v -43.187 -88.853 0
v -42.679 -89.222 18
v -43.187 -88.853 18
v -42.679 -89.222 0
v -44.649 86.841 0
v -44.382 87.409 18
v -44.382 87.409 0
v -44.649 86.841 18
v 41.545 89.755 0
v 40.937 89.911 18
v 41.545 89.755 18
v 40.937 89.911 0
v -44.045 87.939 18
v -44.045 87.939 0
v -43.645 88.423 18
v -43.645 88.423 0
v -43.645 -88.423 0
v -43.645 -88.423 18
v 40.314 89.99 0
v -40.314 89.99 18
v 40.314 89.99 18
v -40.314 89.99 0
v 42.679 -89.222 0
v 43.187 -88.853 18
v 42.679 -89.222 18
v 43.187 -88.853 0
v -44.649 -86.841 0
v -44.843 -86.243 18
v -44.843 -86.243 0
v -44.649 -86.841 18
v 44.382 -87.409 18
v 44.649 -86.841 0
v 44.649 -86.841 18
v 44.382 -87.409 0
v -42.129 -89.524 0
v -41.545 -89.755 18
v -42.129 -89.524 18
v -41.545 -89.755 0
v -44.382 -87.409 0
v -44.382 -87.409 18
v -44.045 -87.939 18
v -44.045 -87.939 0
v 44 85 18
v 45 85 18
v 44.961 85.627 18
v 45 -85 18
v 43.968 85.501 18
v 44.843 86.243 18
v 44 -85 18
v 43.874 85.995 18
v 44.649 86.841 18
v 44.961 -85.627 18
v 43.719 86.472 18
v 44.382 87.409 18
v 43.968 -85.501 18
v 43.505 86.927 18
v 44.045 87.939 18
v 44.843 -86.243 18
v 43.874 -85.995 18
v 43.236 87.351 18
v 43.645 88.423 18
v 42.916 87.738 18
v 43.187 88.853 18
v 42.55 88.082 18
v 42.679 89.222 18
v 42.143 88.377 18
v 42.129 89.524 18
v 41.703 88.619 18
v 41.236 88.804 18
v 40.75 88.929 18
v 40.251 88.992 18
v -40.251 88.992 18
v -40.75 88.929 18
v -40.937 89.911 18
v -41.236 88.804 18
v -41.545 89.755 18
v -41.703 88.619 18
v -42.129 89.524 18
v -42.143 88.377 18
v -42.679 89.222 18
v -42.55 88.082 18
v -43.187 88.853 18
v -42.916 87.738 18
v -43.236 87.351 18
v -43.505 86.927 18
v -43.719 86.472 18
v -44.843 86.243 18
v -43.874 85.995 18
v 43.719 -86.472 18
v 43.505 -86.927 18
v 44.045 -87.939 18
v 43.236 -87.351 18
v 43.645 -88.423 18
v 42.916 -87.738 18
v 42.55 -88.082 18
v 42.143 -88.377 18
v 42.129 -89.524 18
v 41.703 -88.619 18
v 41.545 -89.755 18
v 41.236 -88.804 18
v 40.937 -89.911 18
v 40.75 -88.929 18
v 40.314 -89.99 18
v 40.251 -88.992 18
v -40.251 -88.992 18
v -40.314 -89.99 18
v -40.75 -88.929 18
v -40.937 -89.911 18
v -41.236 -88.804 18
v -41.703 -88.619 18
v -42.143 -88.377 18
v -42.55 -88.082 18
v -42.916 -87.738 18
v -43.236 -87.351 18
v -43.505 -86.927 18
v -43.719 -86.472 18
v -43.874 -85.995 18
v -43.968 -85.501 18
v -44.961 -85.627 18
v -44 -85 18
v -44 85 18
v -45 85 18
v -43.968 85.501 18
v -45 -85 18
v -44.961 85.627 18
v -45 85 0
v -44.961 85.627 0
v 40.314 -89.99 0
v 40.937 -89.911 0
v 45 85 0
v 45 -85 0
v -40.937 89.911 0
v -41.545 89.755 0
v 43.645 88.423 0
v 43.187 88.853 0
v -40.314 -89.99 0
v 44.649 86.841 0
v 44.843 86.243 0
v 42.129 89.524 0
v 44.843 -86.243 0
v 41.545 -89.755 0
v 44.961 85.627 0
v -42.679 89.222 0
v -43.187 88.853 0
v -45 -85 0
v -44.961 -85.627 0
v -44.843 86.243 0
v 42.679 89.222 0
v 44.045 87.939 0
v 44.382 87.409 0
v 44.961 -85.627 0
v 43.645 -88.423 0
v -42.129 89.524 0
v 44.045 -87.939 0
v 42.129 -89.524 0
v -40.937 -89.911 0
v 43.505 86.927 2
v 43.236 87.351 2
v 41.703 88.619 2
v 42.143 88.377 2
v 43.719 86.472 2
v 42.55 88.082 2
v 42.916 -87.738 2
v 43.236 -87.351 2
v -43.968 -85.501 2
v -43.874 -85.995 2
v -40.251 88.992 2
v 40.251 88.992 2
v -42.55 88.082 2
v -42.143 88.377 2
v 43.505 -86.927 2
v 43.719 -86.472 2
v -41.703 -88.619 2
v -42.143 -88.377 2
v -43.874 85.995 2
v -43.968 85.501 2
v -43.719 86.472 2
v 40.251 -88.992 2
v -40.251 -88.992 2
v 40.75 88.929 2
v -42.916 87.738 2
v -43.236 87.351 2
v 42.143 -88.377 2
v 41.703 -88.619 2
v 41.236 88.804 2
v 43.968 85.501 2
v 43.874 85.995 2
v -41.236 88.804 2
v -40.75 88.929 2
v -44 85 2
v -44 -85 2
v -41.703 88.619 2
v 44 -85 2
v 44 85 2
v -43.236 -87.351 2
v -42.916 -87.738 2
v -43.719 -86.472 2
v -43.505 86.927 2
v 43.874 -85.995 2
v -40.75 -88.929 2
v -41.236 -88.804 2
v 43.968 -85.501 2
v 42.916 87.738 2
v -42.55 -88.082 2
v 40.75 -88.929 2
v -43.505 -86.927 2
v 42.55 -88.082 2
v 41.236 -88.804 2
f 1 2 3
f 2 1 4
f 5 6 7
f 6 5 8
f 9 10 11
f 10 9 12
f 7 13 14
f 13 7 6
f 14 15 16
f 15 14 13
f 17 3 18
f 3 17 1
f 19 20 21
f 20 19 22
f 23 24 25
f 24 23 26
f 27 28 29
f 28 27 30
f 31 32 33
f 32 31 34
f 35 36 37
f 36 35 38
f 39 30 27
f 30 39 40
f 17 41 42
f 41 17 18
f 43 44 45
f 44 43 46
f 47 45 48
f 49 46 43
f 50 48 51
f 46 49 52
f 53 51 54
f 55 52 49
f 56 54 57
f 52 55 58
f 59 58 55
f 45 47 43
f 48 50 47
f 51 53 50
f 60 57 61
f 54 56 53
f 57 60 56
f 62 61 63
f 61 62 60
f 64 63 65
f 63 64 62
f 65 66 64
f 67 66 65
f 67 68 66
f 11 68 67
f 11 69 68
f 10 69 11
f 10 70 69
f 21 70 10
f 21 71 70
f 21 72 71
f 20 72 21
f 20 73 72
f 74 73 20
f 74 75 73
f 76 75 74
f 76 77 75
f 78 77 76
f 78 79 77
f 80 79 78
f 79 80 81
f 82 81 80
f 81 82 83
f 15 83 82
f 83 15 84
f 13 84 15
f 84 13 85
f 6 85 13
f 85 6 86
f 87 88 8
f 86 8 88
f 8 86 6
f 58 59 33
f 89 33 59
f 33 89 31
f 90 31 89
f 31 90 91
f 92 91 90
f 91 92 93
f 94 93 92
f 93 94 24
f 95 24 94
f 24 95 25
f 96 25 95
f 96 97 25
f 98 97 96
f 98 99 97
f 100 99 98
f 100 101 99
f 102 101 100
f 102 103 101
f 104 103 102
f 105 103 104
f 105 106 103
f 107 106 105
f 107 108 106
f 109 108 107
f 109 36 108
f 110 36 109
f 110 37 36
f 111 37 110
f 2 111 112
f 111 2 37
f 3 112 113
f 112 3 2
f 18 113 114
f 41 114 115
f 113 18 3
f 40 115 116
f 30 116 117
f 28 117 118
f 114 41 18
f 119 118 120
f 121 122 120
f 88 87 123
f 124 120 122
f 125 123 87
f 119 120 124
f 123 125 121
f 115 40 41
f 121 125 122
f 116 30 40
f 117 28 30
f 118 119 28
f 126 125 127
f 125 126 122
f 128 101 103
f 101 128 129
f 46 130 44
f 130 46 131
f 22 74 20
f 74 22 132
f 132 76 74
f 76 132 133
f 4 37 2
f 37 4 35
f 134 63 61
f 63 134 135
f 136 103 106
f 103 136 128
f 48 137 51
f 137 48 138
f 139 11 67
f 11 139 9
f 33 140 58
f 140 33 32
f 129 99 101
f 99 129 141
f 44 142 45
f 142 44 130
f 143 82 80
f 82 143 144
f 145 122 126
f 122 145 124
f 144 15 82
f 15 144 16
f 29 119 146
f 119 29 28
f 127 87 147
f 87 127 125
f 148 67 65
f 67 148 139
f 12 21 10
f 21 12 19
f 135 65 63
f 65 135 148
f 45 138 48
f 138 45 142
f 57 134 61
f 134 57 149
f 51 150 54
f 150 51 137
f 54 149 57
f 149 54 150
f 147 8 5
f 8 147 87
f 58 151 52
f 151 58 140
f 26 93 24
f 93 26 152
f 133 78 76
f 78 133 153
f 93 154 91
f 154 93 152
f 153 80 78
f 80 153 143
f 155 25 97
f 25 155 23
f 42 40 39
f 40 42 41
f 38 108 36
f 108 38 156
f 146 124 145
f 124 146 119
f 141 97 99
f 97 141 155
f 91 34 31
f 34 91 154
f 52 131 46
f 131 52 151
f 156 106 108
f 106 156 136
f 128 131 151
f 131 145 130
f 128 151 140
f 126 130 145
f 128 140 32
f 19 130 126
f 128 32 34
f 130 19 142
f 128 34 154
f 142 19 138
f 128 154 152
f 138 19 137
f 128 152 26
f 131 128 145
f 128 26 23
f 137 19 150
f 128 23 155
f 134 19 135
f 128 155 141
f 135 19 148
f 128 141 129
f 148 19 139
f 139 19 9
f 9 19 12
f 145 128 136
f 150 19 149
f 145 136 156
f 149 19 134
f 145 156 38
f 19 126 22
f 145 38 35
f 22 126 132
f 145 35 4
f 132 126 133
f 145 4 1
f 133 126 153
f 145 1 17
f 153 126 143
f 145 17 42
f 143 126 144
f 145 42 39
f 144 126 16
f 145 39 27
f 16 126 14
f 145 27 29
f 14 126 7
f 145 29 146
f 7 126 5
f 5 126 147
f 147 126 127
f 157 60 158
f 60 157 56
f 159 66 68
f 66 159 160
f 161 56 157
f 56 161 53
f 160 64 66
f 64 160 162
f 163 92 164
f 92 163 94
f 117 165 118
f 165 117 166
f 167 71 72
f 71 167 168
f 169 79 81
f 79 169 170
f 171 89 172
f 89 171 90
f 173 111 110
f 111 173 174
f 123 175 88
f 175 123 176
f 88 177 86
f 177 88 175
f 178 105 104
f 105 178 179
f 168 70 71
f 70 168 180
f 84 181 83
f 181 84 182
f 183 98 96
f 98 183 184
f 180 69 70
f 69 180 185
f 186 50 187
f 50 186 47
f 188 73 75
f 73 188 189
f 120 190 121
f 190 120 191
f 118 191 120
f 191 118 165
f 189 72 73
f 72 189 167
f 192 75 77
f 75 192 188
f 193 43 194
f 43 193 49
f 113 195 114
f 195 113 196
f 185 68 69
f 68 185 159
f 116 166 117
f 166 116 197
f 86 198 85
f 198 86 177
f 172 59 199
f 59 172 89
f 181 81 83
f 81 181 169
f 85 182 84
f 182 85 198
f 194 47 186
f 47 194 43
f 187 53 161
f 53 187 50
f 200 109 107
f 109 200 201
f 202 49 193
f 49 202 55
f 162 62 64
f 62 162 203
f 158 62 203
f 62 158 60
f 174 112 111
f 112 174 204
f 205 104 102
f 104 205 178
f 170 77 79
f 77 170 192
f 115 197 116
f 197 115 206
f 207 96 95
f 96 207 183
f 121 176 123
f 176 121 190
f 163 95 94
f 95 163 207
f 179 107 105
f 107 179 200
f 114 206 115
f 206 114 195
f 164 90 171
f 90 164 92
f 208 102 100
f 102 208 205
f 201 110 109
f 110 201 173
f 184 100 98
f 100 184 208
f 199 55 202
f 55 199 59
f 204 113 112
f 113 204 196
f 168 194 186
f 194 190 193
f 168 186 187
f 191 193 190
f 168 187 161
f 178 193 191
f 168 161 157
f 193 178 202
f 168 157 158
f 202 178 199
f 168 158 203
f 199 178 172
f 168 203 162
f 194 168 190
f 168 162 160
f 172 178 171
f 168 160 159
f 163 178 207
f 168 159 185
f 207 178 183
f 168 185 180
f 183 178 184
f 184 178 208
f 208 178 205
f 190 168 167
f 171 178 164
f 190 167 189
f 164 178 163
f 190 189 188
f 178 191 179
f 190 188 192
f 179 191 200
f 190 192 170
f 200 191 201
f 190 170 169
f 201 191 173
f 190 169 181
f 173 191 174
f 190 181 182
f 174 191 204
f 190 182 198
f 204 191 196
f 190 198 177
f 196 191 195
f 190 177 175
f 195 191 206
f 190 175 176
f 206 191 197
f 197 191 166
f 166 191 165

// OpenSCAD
$fn = 50;


difference() {
	union() {
		hull() {
			translate(v = [-40.0000000000, 85.0000000000, 0]) {
				cylinder(h = 18, r = 5);
			}
			translate(v = [40.0000000000, 85.0000000000, 0]) {
				cylinder(h = 18, r = 5);
			}
			translate(v = [-40.0000000000, -85.0000000000, 0]) {
				cylinder(h = 18, r = 5);
			}
			translate(v = [40.0000000000, -85.0000000000, 0]) {
				cylinder(h = 18, r = 5);
			}
		}
	}
	union() {
		translate(v = [0, 0, 2]) {
			hull() {
				translate(v = [-40.0000000000, 85.0000000000, 0]) {
					cylinder(h = 16, r = 4);
				}
				translate(v = [40.0000000000, 85.0000000000, 0]) {
					cylinder(h = 16, r = 4);
				}
				translate(v = [-40.0000000000, -85.0000000000, 0]) {
					cylinder(h = 16, r = 4);
				}
				translate(v = [40.0000000000, -85.0000000000, 0]) {
					cylinder(h = 16, r = 4);
				}
			}
		}
	}
}
